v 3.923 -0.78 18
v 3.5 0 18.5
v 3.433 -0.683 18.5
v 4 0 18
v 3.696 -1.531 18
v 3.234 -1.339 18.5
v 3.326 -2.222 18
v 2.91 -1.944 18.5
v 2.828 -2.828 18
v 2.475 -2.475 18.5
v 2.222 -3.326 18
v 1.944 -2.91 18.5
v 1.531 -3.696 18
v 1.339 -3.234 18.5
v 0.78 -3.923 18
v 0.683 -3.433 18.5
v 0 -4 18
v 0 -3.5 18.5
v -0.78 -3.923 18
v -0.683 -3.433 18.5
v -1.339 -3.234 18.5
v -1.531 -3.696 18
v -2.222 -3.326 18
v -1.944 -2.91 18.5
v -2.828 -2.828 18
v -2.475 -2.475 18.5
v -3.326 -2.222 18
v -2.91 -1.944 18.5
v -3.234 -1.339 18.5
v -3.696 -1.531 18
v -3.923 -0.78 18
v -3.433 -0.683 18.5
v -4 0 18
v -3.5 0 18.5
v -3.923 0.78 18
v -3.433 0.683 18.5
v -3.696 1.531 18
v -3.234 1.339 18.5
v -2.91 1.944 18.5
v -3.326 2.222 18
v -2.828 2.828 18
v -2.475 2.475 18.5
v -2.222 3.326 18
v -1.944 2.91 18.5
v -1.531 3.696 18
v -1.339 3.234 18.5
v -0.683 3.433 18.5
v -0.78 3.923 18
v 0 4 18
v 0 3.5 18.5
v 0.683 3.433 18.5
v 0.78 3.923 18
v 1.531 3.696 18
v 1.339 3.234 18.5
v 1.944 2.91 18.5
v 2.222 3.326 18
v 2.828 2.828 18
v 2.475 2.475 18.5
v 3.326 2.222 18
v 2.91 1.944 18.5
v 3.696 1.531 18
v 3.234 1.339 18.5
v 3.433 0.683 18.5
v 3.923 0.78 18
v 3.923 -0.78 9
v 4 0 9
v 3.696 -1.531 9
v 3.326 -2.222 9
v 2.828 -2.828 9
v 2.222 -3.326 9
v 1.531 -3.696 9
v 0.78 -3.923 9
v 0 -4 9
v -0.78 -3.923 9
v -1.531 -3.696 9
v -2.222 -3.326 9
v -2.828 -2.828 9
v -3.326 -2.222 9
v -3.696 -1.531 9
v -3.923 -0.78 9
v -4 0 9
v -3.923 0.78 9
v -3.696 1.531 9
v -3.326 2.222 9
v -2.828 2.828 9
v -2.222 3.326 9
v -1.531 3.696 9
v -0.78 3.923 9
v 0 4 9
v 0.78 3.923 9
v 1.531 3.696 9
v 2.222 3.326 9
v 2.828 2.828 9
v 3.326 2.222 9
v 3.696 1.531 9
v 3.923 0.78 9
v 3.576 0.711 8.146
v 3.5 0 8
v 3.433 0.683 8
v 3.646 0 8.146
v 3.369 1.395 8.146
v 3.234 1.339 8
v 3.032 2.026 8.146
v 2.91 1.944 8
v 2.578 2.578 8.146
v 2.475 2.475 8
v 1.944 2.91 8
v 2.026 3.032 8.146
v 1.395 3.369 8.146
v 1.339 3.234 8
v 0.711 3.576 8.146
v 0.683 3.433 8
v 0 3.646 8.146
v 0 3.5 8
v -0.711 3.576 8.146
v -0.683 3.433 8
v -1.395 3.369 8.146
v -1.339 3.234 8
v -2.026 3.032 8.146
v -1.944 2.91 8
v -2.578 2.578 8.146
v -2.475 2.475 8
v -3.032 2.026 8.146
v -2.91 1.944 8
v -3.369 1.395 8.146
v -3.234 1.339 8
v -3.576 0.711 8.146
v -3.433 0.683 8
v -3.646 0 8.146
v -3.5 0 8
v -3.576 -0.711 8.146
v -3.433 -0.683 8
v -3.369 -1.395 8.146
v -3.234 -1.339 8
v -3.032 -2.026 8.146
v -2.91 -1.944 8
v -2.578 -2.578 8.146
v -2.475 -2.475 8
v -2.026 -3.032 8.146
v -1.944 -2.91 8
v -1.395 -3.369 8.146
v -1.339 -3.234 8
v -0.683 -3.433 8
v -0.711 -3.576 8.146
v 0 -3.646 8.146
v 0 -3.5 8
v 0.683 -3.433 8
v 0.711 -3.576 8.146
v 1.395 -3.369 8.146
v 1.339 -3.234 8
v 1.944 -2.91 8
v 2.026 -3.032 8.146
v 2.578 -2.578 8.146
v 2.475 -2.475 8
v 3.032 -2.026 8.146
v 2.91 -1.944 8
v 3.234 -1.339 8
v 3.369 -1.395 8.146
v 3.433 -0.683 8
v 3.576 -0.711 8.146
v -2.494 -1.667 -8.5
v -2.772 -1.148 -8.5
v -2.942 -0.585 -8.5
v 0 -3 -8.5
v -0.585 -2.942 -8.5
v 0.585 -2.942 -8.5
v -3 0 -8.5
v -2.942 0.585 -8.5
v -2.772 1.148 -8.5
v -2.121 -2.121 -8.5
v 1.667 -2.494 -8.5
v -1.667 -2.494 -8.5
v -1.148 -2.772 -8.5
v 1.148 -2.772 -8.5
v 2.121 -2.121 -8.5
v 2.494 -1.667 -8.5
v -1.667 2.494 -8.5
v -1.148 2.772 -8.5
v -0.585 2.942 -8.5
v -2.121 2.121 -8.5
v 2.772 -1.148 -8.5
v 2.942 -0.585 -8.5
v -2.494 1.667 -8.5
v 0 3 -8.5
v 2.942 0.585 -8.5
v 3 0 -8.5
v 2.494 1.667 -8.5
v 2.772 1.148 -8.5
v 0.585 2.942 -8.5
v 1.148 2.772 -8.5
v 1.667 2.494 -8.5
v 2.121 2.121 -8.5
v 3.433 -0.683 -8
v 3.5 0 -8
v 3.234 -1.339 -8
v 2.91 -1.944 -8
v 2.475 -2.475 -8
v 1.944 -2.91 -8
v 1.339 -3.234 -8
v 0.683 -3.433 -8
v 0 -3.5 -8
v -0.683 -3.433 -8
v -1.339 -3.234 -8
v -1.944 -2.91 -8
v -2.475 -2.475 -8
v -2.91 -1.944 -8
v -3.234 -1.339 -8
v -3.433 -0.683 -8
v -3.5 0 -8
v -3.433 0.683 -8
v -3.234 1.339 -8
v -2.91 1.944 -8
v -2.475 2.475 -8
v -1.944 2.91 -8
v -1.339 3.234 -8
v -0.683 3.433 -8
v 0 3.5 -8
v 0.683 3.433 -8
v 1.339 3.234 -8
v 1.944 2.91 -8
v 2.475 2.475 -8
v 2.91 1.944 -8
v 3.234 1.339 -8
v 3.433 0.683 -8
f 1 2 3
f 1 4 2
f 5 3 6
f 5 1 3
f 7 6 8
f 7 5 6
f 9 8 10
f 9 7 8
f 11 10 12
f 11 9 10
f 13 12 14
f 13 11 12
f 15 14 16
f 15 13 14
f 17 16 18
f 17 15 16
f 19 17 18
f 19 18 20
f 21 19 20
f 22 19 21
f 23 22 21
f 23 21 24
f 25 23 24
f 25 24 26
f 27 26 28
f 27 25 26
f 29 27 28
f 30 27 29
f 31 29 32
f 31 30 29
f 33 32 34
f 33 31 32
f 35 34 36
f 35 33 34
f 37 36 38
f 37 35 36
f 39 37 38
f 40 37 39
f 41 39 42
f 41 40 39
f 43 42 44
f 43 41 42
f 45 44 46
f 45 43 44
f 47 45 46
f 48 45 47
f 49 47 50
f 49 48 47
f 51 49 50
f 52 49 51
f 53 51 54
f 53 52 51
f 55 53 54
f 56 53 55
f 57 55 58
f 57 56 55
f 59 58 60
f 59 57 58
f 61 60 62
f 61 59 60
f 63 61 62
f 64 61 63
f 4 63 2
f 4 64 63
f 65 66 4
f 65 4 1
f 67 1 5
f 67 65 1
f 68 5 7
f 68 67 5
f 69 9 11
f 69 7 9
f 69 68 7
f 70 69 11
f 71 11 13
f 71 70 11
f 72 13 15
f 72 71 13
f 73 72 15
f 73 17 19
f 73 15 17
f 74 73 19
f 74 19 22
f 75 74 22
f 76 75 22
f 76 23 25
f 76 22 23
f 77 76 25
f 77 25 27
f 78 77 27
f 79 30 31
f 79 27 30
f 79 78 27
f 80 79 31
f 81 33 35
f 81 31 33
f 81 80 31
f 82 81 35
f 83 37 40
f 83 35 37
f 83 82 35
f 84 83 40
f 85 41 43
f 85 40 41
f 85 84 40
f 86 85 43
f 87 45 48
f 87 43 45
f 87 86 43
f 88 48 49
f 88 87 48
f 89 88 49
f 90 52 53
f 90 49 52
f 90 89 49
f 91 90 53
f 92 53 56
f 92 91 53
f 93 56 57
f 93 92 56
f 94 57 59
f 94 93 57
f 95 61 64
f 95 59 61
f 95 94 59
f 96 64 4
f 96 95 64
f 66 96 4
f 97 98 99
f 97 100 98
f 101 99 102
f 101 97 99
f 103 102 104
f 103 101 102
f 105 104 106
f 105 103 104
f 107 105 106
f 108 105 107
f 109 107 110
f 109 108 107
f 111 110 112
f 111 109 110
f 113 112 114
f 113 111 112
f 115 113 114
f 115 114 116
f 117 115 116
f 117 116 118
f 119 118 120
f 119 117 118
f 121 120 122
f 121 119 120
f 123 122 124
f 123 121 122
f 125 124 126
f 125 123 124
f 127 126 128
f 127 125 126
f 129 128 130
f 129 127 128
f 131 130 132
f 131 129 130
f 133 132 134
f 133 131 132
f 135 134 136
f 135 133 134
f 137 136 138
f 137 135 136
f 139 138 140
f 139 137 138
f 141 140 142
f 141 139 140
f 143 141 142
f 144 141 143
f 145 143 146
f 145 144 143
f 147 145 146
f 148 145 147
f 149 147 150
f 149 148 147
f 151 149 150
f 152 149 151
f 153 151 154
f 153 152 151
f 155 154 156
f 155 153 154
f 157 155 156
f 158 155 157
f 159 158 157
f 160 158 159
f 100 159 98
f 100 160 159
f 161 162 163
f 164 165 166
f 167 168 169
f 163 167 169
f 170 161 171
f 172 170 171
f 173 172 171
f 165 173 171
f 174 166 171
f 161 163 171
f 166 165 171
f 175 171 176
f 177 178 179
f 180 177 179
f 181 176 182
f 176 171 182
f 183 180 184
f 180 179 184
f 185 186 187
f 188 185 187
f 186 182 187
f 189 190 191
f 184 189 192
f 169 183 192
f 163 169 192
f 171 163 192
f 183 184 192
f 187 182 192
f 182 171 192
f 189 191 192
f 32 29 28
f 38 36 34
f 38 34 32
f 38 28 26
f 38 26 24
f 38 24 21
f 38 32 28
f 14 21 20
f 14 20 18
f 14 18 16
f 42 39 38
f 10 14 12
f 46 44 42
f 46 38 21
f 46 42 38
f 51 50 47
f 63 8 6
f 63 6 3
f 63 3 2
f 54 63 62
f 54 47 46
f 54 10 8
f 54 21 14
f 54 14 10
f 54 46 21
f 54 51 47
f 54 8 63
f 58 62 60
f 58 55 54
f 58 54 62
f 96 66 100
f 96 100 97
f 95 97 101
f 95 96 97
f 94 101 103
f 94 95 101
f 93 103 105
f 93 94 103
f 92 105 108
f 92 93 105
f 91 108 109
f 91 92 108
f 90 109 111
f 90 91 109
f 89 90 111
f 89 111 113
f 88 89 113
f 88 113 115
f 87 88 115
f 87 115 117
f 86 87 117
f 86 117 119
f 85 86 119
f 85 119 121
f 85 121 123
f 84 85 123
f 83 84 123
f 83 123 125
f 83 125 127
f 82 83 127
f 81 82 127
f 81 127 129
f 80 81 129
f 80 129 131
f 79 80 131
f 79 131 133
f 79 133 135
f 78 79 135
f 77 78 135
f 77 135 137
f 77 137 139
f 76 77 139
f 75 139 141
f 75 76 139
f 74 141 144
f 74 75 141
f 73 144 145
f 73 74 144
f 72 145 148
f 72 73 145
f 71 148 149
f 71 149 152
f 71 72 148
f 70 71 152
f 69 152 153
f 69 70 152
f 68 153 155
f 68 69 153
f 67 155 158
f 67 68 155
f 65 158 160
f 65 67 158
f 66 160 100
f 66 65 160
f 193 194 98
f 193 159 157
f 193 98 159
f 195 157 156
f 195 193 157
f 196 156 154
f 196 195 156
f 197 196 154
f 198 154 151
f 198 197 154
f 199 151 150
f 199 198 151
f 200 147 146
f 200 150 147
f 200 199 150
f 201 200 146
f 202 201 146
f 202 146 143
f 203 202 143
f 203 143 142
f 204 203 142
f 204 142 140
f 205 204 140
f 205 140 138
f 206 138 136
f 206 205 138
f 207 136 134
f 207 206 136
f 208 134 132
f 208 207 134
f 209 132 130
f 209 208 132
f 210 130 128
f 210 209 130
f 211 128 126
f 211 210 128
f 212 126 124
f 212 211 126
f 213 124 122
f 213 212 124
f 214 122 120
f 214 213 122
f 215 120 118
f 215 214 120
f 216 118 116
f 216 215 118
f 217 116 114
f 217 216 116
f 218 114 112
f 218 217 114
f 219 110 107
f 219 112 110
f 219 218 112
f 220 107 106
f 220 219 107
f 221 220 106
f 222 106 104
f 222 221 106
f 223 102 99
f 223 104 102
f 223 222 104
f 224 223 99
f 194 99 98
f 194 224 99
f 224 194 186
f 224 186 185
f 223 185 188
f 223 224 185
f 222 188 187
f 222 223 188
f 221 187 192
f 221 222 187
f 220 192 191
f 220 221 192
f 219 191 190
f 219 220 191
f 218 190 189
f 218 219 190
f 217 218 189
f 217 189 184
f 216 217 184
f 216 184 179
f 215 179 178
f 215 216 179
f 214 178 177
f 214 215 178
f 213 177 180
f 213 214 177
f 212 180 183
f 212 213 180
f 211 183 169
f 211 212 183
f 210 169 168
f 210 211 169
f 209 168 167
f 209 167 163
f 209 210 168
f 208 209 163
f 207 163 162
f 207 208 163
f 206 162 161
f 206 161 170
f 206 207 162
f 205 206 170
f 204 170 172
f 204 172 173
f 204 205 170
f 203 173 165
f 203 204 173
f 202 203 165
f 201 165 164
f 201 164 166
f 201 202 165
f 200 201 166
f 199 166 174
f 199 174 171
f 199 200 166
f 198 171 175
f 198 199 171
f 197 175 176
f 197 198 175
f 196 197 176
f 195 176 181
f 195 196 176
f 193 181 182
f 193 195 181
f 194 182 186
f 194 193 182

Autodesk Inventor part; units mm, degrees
ref_plane "YZ Plane" through (0, 0, 0) normal (1, 0, 0) x (0, 1, 0)
ref_plane "XZ Plane" through (0, 0, 0) normal (0, 1, 0) x (-1, 0, 0)
ref_plane "XY Plane" through (0, 0, 0) normal (0, 0, 1) x (1, 0, 0)
sketch "Sketch1" plane through (0, 0, 0) normal (0, 0, 1) x (1, 0, 0)
  circle A0 centre (0, 0) radius 3.5
  dimension "d0" = 7
extrude "Extrusion1" add sketch "Sketch1" along normal mid plane 17
sketch "Sketch2" plane through (0, 0, 8.5) normal (0, 0, 1) x (1, 0, 0)
  circle A0 centre (0, 0) radius 3.5 projected
  circle A1 centre (0, 0) radius 4
  dimension "d3" = 8
extrude "Extrusion2" add sketch "Sketch2" along normal blind 10 contours A0 | A1
chamfer "Chamfer1" distance 0.5 angle 45 4 edges at (-3.5, 0, -8.5) (-3.5, 0, 8.5) (-4, 0, 8.5) (-4, 0, 18.5)
properties part number "as gearbox" material "Stainless Steel"
